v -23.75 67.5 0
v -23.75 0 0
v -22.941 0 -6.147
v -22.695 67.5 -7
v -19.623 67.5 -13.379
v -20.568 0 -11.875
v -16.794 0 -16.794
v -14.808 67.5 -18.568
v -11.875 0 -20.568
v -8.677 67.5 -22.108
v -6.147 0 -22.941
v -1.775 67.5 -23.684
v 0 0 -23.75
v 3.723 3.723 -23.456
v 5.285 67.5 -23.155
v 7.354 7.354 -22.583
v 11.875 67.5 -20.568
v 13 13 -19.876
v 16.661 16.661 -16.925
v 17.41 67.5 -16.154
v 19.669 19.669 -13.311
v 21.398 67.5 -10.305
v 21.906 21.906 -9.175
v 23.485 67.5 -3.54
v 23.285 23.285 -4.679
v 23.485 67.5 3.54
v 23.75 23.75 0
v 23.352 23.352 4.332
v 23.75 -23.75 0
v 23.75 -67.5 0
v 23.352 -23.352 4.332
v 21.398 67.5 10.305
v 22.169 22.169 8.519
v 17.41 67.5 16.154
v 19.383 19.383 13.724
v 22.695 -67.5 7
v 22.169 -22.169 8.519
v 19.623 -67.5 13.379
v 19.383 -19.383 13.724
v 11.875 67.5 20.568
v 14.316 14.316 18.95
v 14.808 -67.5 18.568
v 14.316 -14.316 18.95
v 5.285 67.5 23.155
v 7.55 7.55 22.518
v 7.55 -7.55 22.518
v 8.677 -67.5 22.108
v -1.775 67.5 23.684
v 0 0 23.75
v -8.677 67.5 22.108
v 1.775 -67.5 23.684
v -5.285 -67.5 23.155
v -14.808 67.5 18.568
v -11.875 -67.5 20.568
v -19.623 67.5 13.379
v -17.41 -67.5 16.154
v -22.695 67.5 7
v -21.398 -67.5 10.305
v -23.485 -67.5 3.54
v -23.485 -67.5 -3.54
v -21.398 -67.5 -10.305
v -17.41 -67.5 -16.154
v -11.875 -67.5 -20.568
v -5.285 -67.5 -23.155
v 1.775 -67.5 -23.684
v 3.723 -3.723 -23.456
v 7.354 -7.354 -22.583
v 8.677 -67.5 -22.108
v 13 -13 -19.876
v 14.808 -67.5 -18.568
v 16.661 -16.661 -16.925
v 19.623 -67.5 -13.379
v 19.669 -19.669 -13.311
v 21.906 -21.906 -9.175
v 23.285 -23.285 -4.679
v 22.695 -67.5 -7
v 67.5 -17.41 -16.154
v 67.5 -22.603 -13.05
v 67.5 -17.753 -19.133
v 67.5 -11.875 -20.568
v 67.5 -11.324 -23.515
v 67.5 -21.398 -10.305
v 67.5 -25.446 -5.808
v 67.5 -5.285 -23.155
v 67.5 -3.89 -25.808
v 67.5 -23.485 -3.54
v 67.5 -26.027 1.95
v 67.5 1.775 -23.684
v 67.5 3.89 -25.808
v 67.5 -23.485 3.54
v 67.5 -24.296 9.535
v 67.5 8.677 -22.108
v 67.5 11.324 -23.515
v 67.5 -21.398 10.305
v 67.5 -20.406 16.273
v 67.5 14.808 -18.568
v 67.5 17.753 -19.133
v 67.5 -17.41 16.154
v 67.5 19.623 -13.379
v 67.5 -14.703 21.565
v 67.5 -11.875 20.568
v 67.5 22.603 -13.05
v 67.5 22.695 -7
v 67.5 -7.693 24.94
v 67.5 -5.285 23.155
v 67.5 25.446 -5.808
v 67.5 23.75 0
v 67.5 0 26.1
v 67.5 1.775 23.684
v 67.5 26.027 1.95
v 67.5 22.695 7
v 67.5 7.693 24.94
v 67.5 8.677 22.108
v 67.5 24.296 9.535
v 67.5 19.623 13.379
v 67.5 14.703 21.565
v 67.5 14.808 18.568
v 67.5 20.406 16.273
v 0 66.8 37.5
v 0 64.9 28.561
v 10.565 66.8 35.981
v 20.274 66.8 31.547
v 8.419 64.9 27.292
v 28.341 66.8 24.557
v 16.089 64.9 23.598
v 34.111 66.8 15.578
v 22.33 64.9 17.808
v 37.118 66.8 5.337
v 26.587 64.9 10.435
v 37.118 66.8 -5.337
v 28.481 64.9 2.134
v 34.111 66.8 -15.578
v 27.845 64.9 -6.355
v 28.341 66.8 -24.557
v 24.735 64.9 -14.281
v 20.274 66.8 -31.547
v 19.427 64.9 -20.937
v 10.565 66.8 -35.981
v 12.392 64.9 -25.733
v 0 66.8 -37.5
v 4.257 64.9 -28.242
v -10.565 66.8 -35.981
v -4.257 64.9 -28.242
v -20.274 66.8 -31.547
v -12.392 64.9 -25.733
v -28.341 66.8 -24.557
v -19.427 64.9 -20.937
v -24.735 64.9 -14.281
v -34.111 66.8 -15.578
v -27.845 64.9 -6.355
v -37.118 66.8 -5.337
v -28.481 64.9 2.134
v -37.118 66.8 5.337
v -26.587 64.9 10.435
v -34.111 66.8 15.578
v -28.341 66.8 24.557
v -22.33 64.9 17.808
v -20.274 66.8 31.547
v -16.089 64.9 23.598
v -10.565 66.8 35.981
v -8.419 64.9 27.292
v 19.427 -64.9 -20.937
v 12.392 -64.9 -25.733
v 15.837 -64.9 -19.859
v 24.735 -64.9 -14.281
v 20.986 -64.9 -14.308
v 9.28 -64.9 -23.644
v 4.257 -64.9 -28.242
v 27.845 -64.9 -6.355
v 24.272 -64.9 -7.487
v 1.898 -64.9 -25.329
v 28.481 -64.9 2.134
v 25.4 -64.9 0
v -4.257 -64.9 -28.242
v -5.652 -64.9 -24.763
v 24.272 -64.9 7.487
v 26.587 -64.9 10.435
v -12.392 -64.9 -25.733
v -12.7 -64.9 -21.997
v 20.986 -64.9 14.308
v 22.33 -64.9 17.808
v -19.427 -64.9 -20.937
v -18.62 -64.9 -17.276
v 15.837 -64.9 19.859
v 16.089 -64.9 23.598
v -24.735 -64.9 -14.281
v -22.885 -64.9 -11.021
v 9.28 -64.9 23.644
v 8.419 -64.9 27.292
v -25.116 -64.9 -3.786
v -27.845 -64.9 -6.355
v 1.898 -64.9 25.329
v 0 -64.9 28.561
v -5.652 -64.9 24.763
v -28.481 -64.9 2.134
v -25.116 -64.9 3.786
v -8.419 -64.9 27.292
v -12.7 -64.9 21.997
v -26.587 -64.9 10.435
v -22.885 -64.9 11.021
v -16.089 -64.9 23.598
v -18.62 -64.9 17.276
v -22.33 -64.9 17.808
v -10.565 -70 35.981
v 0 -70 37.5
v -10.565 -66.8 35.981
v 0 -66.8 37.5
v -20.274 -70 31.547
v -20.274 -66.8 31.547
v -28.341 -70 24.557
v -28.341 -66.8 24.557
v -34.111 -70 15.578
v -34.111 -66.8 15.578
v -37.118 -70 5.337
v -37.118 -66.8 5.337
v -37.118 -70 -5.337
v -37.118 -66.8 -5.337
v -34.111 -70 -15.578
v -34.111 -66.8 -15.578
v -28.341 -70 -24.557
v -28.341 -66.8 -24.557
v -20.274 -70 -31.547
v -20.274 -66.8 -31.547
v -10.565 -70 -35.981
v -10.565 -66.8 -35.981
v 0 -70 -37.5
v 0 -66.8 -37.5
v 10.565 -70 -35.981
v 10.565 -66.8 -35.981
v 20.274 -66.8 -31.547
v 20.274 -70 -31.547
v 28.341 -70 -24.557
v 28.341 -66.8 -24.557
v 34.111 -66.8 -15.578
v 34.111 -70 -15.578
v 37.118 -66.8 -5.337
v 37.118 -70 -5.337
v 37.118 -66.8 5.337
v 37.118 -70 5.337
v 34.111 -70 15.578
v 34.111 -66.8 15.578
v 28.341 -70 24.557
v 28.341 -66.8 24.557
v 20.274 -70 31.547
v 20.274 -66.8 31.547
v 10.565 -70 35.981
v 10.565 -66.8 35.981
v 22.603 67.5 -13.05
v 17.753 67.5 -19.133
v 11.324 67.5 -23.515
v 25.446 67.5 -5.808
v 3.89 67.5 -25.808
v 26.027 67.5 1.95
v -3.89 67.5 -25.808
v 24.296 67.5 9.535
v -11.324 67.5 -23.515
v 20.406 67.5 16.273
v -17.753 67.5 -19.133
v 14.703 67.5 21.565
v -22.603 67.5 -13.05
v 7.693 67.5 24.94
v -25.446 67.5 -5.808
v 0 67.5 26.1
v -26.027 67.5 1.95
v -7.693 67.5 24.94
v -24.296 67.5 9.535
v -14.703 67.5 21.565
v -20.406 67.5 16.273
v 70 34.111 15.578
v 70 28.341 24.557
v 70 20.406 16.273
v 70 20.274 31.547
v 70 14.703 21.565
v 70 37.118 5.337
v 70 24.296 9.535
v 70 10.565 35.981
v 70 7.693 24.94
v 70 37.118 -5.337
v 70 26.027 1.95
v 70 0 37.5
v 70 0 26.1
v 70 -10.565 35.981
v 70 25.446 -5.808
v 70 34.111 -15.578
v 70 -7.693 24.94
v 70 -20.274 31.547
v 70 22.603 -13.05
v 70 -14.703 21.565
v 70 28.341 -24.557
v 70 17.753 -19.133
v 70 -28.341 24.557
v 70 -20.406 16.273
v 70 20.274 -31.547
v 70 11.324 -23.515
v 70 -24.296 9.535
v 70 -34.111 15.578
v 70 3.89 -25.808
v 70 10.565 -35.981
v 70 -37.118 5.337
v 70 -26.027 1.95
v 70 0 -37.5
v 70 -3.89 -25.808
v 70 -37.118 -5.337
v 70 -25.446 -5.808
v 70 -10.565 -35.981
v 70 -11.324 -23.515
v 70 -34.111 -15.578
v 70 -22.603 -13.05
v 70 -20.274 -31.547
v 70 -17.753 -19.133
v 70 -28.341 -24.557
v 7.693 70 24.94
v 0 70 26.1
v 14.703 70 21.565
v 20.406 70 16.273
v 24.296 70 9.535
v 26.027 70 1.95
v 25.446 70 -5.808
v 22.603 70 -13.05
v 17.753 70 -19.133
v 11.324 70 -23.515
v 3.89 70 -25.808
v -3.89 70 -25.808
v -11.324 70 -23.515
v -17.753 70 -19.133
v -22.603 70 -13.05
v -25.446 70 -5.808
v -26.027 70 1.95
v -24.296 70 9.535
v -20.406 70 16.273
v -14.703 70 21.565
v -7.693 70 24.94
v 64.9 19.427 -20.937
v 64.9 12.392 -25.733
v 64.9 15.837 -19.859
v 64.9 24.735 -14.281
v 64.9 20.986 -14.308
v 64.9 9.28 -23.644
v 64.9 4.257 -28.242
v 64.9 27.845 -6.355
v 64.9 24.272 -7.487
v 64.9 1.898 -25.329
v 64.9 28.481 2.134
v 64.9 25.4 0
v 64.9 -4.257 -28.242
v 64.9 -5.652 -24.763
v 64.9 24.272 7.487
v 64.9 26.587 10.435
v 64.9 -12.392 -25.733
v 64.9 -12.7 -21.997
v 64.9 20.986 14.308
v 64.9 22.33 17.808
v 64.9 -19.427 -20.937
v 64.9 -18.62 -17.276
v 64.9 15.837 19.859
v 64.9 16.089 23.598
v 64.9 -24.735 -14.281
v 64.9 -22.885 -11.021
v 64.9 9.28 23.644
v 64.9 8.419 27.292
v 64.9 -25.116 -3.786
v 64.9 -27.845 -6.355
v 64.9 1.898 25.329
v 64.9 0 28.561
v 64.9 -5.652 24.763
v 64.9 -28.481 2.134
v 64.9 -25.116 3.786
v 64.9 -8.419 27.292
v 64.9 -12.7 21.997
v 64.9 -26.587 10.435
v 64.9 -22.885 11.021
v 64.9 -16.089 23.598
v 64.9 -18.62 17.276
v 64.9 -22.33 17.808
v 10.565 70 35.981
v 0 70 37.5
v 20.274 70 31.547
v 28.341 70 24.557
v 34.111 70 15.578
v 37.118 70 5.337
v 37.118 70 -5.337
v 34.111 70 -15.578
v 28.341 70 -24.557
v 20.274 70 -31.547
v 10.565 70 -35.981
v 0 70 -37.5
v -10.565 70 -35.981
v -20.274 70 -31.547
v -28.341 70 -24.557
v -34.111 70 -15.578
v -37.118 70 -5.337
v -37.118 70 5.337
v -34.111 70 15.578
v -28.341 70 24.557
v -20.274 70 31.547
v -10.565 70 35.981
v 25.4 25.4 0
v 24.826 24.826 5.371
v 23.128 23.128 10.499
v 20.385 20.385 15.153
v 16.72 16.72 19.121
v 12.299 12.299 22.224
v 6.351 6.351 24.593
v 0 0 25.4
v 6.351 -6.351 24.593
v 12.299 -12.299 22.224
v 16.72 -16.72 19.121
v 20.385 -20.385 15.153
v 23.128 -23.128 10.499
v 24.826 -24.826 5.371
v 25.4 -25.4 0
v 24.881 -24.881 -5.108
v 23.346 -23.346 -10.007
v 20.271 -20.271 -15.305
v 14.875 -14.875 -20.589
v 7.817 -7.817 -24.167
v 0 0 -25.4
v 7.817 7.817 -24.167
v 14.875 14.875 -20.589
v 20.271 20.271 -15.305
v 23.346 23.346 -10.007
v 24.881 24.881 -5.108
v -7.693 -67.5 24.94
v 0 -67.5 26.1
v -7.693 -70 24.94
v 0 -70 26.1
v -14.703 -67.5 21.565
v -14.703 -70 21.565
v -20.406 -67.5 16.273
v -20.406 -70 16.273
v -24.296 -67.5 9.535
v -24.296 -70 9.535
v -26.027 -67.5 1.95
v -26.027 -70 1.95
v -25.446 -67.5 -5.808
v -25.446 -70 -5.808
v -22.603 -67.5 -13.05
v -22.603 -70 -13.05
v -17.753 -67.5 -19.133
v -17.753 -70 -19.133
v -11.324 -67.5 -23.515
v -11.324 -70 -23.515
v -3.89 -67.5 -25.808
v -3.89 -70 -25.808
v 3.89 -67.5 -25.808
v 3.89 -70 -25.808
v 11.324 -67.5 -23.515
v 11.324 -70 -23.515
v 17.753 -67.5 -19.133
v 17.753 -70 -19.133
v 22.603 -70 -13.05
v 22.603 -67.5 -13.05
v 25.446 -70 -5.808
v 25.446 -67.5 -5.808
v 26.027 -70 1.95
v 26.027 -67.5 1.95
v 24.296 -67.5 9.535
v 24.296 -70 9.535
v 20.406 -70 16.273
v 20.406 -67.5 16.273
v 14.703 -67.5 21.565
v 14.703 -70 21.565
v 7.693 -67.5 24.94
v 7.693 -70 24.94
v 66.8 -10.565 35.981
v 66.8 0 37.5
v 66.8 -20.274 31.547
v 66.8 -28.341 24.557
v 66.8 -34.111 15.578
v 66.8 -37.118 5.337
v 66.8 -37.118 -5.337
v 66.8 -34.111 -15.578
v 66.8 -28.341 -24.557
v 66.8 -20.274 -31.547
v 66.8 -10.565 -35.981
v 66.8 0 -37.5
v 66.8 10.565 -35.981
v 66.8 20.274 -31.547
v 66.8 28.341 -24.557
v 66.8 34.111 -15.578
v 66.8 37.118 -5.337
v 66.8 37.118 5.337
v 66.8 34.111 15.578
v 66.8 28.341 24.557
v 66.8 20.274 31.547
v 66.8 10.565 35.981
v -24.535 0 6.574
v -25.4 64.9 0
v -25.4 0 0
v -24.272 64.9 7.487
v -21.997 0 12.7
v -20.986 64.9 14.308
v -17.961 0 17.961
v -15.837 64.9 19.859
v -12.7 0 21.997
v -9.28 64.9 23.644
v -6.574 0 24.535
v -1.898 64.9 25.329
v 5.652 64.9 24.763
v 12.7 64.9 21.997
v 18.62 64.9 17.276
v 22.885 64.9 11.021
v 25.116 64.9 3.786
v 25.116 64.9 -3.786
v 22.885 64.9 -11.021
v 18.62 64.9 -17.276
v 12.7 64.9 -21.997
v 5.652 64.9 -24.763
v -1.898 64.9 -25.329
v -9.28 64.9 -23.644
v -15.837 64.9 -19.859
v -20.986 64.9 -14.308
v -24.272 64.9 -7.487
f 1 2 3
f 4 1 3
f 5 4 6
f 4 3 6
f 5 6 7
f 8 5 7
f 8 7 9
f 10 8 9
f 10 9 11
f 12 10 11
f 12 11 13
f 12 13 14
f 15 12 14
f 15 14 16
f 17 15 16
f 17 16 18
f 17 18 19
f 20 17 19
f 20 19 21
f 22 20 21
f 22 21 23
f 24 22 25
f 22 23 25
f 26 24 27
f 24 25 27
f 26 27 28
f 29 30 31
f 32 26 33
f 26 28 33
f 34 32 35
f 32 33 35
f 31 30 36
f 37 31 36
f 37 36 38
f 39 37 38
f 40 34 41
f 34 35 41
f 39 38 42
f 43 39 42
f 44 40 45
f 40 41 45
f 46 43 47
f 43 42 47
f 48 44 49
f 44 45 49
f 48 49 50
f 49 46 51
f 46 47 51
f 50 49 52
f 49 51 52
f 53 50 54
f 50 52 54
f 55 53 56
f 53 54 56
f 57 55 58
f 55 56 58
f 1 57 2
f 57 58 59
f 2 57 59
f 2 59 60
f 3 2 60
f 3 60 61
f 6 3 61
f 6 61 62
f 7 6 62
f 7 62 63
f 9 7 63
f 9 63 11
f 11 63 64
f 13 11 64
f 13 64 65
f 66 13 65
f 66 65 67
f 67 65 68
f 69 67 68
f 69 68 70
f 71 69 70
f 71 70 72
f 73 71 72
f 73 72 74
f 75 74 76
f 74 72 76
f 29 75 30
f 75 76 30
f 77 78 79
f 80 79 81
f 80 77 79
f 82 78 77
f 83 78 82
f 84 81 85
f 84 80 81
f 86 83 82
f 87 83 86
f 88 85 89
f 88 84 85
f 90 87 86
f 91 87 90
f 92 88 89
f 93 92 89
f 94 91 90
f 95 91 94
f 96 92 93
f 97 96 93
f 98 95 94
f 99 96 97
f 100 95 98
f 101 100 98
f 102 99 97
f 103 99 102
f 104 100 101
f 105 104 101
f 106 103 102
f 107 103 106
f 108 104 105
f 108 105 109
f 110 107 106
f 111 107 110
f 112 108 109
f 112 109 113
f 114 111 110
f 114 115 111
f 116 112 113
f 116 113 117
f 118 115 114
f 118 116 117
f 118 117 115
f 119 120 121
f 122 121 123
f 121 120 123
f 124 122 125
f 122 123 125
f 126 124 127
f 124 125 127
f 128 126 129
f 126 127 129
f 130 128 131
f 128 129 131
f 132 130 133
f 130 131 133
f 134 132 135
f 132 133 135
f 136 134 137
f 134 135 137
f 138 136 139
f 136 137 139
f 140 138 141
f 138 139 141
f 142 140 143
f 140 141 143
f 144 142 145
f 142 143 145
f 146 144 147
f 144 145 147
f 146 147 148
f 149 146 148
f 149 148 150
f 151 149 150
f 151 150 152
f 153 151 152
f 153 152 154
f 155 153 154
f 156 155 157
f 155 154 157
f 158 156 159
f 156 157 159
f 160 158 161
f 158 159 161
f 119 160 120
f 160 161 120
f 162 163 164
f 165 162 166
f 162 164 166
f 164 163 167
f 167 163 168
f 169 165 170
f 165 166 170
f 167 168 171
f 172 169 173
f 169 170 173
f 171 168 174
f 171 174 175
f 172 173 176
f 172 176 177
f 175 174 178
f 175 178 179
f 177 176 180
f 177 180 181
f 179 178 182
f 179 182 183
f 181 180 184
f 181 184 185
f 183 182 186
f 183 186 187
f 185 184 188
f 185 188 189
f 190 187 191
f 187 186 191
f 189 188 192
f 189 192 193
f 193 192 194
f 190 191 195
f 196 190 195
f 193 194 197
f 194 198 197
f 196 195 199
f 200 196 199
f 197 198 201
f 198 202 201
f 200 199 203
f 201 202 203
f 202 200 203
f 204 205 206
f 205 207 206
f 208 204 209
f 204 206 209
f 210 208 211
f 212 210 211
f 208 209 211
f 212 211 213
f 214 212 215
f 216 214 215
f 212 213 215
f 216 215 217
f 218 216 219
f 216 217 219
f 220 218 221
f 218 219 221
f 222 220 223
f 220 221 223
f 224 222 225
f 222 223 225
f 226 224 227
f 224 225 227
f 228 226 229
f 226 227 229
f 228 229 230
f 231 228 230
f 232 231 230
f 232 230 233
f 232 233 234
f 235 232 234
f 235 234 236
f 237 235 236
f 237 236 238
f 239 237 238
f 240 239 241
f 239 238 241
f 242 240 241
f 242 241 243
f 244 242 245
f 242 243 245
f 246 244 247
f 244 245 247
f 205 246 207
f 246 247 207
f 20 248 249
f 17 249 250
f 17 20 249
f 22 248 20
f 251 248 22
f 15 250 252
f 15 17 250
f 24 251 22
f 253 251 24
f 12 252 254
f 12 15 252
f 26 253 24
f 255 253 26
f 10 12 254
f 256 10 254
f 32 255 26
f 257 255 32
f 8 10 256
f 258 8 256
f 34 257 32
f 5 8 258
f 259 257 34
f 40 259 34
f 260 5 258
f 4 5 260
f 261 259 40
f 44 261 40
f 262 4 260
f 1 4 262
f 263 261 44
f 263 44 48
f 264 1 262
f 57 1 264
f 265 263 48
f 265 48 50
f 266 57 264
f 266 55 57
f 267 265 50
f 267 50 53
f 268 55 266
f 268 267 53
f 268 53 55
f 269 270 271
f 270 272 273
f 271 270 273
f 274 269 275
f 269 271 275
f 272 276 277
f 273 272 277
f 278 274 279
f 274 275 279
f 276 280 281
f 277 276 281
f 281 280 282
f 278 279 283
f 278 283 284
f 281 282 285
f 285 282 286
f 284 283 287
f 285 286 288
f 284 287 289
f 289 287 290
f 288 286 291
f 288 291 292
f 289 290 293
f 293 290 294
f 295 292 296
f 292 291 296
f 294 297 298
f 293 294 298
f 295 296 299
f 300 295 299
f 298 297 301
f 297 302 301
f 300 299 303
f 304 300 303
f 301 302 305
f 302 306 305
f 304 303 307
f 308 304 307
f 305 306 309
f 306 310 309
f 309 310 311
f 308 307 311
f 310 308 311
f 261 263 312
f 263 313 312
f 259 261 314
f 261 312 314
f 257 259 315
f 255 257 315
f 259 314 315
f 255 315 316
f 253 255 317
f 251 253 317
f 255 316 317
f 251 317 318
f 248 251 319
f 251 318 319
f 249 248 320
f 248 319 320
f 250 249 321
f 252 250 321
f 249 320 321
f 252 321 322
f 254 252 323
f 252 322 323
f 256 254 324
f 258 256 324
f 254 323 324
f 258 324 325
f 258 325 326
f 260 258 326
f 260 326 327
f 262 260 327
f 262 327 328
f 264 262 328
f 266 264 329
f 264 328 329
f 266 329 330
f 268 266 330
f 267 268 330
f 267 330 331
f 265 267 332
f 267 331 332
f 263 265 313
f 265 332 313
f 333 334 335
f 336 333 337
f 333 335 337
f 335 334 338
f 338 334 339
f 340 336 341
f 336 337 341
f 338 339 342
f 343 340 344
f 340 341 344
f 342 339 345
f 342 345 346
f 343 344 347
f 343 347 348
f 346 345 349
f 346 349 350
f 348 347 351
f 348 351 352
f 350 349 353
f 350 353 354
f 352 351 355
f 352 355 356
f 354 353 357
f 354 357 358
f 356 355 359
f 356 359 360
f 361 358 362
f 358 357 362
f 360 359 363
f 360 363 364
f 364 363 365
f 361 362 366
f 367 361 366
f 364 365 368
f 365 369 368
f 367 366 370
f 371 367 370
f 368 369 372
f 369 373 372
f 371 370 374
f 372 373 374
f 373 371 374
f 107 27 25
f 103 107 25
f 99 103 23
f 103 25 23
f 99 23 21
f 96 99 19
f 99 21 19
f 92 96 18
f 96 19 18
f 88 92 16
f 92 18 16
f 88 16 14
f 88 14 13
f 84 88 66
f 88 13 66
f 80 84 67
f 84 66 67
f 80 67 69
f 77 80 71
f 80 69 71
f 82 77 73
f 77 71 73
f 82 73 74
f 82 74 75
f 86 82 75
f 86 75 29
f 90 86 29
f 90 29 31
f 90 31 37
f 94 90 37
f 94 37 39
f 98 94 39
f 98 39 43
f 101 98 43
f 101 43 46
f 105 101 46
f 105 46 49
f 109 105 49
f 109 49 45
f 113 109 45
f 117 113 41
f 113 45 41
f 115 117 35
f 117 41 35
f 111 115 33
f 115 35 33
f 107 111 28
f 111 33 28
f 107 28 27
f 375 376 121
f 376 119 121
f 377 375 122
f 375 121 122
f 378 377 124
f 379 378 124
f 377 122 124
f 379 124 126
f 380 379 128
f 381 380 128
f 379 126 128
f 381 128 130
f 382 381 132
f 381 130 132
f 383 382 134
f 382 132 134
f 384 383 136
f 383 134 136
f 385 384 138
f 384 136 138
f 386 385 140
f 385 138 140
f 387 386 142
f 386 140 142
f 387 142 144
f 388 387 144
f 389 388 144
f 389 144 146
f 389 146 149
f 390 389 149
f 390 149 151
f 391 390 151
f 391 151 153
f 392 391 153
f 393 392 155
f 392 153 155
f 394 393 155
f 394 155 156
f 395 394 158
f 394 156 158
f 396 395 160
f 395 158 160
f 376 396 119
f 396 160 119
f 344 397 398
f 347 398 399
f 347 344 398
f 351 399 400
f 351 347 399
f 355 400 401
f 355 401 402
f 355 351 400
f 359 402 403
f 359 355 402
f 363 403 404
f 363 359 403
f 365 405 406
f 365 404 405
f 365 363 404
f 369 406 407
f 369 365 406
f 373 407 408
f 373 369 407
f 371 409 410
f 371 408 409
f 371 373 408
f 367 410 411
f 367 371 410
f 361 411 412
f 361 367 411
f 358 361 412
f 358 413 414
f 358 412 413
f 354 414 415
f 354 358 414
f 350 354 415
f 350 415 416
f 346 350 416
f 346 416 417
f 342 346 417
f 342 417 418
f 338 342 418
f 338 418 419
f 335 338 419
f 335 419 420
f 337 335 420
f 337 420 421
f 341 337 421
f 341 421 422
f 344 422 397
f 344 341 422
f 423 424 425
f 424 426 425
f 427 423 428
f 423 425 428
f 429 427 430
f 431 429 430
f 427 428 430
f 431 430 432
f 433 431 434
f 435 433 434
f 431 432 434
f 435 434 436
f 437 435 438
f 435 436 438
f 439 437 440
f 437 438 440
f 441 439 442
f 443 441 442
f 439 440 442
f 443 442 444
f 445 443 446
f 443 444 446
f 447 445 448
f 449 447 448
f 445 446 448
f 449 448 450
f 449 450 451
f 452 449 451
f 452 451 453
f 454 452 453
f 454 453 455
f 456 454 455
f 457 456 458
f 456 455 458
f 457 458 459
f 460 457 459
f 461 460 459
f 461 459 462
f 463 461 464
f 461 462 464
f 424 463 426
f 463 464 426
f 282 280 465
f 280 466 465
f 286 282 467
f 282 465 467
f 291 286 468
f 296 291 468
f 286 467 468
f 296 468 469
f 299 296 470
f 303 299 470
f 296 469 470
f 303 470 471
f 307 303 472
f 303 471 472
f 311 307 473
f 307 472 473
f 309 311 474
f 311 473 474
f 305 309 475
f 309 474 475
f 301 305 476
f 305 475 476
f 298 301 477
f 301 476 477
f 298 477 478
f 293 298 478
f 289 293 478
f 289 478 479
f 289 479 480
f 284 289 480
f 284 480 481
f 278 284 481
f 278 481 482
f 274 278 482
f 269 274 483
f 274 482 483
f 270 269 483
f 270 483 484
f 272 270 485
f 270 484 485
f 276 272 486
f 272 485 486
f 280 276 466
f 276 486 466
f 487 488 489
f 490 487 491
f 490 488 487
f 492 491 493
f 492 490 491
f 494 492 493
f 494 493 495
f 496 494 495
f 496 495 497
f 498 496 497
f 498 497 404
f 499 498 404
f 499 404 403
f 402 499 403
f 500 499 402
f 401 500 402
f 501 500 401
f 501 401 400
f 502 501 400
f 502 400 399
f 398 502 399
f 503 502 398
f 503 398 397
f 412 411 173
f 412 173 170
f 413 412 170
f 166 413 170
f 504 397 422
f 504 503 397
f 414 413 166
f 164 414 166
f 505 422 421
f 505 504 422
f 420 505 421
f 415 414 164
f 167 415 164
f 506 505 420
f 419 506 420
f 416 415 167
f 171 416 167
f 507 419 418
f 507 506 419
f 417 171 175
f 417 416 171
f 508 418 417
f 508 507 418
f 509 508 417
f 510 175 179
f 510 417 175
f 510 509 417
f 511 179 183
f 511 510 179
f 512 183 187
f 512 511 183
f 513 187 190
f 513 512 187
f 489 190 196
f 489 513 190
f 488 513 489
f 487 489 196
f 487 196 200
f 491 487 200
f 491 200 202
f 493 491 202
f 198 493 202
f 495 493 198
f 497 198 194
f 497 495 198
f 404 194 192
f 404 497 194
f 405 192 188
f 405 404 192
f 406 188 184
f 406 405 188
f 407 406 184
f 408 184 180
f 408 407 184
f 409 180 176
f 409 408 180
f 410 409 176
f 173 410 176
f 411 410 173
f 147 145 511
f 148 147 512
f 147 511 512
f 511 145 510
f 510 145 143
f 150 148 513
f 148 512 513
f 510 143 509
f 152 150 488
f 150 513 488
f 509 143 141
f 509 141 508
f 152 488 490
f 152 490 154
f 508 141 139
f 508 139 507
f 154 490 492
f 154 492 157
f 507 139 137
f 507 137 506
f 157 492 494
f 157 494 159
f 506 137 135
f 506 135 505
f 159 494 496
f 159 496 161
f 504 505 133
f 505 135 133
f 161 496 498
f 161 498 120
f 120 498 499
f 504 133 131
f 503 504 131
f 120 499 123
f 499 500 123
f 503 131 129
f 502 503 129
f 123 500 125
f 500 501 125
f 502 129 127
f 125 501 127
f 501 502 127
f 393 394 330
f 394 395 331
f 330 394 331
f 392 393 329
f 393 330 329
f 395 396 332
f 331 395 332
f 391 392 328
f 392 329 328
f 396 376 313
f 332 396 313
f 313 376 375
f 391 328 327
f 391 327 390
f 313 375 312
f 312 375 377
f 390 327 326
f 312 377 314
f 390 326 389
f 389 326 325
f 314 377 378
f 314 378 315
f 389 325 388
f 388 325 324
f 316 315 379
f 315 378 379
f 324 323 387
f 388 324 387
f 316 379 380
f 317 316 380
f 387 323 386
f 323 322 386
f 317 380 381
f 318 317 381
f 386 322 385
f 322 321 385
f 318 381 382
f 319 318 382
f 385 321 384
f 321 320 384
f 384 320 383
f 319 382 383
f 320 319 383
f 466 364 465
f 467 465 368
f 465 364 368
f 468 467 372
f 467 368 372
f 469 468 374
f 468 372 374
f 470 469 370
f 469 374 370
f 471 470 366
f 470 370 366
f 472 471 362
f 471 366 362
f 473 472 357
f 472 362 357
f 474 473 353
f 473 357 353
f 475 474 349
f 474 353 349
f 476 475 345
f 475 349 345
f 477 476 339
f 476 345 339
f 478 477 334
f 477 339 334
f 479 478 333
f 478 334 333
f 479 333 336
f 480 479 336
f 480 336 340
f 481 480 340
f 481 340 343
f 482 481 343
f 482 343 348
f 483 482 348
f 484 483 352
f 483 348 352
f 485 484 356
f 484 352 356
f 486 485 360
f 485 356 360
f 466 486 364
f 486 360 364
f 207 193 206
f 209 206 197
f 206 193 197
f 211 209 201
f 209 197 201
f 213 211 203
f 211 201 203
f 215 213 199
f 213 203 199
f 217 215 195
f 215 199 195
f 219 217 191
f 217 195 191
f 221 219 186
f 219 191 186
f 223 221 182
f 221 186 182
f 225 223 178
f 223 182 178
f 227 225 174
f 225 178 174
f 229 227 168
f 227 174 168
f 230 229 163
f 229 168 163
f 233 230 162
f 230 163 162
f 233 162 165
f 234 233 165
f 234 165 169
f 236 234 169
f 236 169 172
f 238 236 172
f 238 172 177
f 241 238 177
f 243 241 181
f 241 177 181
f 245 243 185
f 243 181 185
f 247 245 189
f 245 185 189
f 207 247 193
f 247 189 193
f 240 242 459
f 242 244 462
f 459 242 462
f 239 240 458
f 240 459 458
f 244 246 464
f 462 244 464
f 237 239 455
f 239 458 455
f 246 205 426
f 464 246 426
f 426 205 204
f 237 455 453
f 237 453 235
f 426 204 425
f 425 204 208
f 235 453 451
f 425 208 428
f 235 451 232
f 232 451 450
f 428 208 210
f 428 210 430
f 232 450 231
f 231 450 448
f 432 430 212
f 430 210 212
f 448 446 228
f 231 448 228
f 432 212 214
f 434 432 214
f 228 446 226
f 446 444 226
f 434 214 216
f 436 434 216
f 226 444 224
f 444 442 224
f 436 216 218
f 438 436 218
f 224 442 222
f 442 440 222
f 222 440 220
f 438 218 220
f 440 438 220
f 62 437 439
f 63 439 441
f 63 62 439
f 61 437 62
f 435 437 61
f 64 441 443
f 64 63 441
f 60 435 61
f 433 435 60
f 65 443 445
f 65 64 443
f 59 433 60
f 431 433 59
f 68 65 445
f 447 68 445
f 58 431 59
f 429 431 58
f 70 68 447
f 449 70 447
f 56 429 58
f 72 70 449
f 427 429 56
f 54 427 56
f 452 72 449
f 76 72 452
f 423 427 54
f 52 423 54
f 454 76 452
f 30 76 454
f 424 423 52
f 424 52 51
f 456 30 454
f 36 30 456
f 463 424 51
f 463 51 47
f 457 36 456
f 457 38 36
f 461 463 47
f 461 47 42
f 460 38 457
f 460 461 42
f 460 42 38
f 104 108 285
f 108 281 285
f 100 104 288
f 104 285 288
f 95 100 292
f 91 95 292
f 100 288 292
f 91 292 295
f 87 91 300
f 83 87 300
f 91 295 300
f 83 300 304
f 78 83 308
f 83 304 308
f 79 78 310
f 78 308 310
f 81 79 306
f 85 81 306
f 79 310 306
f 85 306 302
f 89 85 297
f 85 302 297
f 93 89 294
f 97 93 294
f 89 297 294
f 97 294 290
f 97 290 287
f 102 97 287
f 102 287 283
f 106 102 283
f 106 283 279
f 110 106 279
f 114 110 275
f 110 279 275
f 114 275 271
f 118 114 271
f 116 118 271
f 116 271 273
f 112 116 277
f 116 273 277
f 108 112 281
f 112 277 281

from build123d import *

# Parameters (mm, degrees)
SKETCH5_R         = 25.4
STUB_DEPTH        = 67.5
CIRPATTERN1_COUNT = 3
CIRPATTERN1_ANGLE = 180
BORE_SKETCH_R     = 23.75
BORE_DEPTH        = 71
CIRPATTERN2_COUNT = 3
CIRPATTERN2_ANGLE = 180


with BuildPart() as part:
    # Sketch1 → Flange (revolve)
    with BuildSketch(Plane(origin=(0, 0, 0), x_dir=(0, 0, -1), z_dir=(1, 0, 0))):
        Polygon((-37.5, -70), (-37.5, -66.8), (-28.561202792, -64.9), (0, -64.9), (0, -67.5), (-26.1, -67.5), (-26.1, -70), align=None)
    revolve(axis=Axis((0, 0, 0), (0, -1, 0)))

    # Sketch5 → Stub (add)
    with BuildSketch(Plane.XZ.offset(67.5)):
        Circle(SKETCH5_R)
    extrude(amount=-STUB_DEPTH)


with BuildPart() as cirpattern1_1:
    # CirPattern1: pattern copy
    add(part.part.rotate(Axis((0, 0, 0), (0, 0, 1)), 1 * CIRPATTERN1_ANGLE / (CIRPATTERN1_COUNT - 1)))


with BuildPart() as cirpattern1_2:
    # CirPattern1: pattern copy
    add(part.part.rotate(Axis((0, 0, 0), (0, 0, 1)), 2 * CIRPATTERN1_ANGLE / (CIRPATTERN1_COUNT - 1)))


with BuildPart() as part_1:
    add(part.part)

    # Combine1: union CirPattern1_1, CirPattern1_2
    add(cirpattern1_1.part)
    add(cirpattern1_2.part)

    # Bore Sketch → Bore (cut, through all)
    with BuildSketch(Plane(origin=(0, 0, 0), x_dir=(1, 0, 0), z_dir=(0, 1, 0))):
        Circle(BORE_SKETCH_R)
    bore = extrude(amount=-BORE_DEPTH, mode=Mode.SUBTRACT)

    # CirPattern2: Bore ×3 about axis
    cirpattern2_axis = Axis((0, 0, -30.25), (0, 0, 1))
    for i in range(1, CIRPATTERN2_COUNT):
        add(bore.rotate(cirpattern2_axis, i * CIRPATTERN2_ANGLE / (CIRPATTERN2_COUNT - 1)), mode=Mode.SUBTRACT)


solid = part_1.part
